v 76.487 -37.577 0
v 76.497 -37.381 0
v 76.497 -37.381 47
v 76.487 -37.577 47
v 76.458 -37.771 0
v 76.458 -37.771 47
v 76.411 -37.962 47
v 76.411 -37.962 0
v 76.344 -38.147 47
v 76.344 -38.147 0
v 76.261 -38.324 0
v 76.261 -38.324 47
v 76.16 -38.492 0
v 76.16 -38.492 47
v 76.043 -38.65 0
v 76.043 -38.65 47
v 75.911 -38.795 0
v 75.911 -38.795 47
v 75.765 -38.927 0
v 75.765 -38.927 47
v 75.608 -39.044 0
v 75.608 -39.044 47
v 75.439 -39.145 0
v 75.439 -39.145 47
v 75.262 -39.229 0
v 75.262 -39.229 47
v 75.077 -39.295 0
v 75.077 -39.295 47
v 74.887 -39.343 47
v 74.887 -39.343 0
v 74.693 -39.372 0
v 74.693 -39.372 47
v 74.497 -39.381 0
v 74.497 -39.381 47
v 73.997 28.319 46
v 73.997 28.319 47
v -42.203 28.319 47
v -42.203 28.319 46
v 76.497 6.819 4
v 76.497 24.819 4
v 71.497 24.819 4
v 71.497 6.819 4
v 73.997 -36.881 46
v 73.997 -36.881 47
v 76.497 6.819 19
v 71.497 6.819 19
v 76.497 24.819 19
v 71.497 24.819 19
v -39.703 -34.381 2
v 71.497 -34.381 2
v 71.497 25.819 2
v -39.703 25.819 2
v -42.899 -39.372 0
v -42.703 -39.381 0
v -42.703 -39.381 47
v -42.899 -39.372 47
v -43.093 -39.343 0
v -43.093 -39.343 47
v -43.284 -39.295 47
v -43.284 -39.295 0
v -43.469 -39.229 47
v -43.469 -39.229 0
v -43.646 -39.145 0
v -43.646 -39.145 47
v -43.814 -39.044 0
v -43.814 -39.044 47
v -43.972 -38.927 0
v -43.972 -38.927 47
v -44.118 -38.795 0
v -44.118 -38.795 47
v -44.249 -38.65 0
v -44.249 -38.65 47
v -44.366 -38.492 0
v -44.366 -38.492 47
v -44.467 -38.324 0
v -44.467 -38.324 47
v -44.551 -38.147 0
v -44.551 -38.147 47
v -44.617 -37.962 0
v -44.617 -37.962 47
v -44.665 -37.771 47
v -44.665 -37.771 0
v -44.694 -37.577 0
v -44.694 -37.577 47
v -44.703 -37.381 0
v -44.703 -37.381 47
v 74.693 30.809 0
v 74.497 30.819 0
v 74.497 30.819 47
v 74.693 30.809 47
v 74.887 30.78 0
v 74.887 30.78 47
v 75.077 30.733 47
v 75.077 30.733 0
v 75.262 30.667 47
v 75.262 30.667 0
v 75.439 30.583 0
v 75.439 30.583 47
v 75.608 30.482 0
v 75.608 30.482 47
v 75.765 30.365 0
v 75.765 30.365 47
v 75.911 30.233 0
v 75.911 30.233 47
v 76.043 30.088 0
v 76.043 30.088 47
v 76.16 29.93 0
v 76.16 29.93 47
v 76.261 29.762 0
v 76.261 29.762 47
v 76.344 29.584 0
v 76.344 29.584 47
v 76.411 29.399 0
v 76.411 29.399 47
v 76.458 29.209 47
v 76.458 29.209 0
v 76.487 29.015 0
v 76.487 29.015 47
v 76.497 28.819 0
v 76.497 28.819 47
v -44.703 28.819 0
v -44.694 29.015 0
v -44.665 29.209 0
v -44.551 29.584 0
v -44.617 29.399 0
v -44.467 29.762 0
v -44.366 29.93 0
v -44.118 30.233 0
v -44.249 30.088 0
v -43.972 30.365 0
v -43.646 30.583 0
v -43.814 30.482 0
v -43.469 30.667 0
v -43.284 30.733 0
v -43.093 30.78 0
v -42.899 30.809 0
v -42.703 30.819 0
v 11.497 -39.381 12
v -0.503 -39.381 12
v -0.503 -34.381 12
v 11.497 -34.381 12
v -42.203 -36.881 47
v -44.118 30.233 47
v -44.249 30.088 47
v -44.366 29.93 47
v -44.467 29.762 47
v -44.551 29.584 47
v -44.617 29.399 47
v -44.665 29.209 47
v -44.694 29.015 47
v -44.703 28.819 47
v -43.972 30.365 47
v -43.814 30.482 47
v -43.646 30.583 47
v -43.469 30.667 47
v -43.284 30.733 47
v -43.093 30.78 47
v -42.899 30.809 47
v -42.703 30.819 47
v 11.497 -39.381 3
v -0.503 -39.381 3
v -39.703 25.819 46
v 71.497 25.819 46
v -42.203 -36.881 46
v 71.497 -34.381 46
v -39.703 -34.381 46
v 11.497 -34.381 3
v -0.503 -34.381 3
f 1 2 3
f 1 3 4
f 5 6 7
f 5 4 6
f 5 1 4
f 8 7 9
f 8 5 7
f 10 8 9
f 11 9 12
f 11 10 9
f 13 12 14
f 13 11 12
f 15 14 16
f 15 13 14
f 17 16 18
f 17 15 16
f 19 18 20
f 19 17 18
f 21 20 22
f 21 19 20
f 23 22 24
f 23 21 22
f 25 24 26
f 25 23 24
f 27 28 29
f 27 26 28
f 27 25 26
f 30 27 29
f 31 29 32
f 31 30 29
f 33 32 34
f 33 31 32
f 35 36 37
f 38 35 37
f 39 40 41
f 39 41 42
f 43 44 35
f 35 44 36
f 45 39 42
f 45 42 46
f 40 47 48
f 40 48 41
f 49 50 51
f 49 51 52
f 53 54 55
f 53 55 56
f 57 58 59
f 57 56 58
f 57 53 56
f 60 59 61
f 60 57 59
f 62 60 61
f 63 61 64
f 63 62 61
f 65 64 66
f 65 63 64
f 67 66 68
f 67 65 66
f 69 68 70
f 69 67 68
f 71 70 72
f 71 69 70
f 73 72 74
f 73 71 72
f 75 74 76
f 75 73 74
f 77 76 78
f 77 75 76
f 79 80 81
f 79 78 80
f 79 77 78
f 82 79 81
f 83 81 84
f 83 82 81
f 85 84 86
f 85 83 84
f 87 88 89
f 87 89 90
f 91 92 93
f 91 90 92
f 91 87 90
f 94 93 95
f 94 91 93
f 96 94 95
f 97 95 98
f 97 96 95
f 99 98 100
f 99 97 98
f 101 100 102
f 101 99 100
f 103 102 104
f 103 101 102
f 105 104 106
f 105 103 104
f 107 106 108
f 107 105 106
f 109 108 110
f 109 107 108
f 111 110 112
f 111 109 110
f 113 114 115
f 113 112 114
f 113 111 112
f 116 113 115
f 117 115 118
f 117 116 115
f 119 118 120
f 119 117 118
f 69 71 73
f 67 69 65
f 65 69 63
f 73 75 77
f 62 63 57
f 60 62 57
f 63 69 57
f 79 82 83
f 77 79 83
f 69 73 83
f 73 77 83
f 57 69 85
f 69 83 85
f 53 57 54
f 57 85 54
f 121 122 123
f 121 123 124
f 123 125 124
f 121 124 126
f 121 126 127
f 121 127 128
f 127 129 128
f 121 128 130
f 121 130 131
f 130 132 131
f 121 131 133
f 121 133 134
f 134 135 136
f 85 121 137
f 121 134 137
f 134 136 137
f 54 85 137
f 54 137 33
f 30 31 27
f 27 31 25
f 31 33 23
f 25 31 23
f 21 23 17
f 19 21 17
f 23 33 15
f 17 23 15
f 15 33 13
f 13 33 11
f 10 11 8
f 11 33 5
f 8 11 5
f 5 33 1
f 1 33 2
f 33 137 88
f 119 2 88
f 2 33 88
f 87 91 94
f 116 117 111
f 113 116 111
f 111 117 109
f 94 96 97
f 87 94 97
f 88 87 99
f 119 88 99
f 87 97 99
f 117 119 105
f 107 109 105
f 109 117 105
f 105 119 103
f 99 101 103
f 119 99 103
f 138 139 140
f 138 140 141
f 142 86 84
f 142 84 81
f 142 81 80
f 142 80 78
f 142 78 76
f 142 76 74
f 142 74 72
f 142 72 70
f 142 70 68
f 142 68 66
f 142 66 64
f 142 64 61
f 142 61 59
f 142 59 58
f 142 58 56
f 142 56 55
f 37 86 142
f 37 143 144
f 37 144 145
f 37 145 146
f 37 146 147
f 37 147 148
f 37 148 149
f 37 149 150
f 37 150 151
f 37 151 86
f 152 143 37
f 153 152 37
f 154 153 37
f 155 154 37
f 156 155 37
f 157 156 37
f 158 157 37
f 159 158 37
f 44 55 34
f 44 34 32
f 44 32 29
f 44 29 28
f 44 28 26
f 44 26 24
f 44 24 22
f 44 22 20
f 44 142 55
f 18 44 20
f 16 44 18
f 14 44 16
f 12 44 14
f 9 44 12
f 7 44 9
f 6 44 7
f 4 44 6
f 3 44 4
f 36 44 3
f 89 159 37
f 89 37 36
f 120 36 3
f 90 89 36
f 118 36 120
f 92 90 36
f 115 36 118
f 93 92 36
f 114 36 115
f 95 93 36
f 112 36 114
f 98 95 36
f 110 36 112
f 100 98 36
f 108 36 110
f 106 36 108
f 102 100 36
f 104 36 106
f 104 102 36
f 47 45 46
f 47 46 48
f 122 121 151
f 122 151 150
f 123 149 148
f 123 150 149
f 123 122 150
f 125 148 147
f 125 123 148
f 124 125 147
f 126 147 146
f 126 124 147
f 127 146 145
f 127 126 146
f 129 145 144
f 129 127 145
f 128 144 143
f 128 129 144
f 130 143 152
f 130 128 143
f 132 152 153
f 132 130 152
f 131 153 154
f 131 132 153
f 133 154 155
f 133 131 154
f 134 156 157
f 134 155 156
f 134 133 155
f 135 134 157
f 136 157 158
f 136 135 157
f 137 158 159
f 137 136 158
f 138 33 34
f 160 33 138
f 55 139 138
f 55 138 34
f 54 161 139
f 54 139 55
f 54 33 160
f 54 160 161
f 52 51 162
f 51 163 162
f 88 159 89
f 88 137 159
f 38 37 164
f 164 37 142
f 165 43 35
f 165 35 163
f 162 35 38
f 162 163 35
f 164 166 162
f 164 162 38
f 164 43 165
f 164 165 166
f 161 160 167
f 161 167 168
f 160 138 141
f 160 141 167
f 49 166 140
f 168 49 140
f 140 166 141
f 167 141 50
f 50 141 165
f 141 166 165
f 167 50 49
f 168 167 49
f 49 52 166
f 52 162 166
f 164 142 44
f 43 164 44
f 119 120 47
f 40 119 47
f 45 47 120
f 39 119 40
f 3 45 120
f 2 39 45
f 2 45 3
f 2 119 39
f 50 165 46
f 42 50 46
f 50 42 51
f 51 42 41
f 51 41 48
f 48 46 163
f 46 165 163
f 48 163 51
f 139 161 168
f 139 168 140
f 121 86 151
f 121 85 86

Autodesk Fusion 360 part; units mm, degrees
sketch "Esquisse1" plane through (0, 0, 0) normal (0, 0, 1) x (1, 0, 0)
  line L0 (74.4967, -39.3812) -> (-42.7033, -39.3812)
  line L1 (-42.7033, 30.8188) -> (74.4967, 30.8188)
  line L2 (76.4967, 28.8188) -> (76.4967, -37.3812)
  line L3 (-44.7033, -37.3812) -> (-44.7033, 28.8188)
  arc A0 (76.4967, 28.8188) -> (74.4967, 30.8188) centre (74.4967, 28.8188) ccw
  arc A1 (-42.7033, 30.8188) -> (-44.7033, 28.8188) centre (-42.7033, 28.8188) ccw
  arc A2 (-44.7033, -37.3812) -> (-42.7033, -39.3812) centre (-42.7033, -37.3812) ccw
  arc A3 (74.4967, -39.3812) -> (76.4967, -37.3812) centre (74.4967, -37.3812) ccw
  point P0 (-37.2797, 0.2421)
  point P1 (-65.57, -27.6552)
  dimension "d25" = 121.2
  dimension "d26" = 70.2
  dimension "d31" = 2
  dimension "d32" = 2
  dimension "d33" = 2
  dimension "d34" = 2
extrude "Extrusion1" add sketch "Esquisse1" along normal blind 47
sketch "Esquisse2" plane through (0, 0, 47) normal (0, 0, 1) x (-1, 0, 0)
  arc A0 (44.7033, 37.3812) -> (42.7033, 39.3812) centre (42.7033, 37.3812) ccw
  line L0 (42.7033, 39.3812) -> (-74.4967, 39.3812)
  arc A1 (-74.4967, 39.3812) -> (-76.4967, 37.3812) centre (-74.4967, 37.3812) ccw
  line L1 (-76.4967, 37.3812) -> (-76.4967, -28.8188)
  arc A2 (-76.4967, -28.8188) -> (-74.4967, -30.8188) centre (-74.4967, -28.8188) ccw
  line L2 (-74.4967, -30.8188) -> (42.7033, -30.8188)
  arc A3 (42.7033, -30.8188) -> (44.7033, -28.8188) centre (42.7033, -28.8188) ccw
  line L3 (44.7033, -28.8188) -> (44.7033, 37.3812)
  line L4 (39.7033, -25.8188) -> (39.7033, 34.3812)
  line L5 (39.7033, 34.3812) -> (-71.4967, 34.3812)
  line L6 (-71.4967, 34.3812) -> (-71.4967, -25.8188)
  line L7 (-71.4967, -25.8188) -> (39.7033, -25.8188)
  line L8 (42.2033, -28.3188) -> (42.2033, 36.8812)
  line L9 (42.2033, 36.8812) -> (-73.9967, 36.8812)
  line L10 (-73.9967, 36.8812) -> (-73.9967, -28.3188)
  line L11 (-73.9967, -28.3188) -> (42.2033, -28.3188)
  dimension "d37" = -2.5
  dimension "d49" = -5
extrude "Extrusion2" cut sketch "Esquisse2" against normal blind 1 contours L4 L5 L6 L7 | L8 L9 L10 L11
extrude "Extrusion4" cut sketch "Esquisse2" against normal blind 45 contours L4 L5 L6 L7
sketch "Esquisse3" plane through (76.4967, 0, 0) normal (1, 0, 0) x (0, 1, 0)
  line L0 (-37.3812, 0) -> (28.8188, 0)
  line L1 (28.8188, 0) -> (28.8188, 47)
  line L2 (28.8188, 47) -> (-37.3812, 47)
  line L3 (-37.3812, 47) -> (-37.3812, 0)
  line L4 (6.8188, 19) -> (24.8188, 19)
  line L5 (24.8188, 19) -> (24.8188, 4)
  line L6 (24.8188, 4) -> (6.8188, 4)
  line L7 (6.8188, 4) -> (6.8188, 19)
  dimension "d40" = 18
  dimension "d42" = 19
  dimension "d44" = 4
  dimension "d47" = 15
extrude "Extrusion3" cut sketch "Esquisse3" against normal blind 50 contours L4 L5 L6 L7
sketch "Esquisse4" plane through (0, -39.3812, 0) normal (0, -1, 0) x (1, 0, 0)
  line L0 (-42.7033, 0) -> (74.4967, 0)
  line L1 (74.4967, 0) -> (74.4967, 47)
  line L2 (74.4967, 47) -> (-42.7033, 47)
  line L3 (-42.7033, 47) -> (-42.7033, 0)
  line L4 (-0.5033, 12) -> (11.4967, 12)
  line L5 (11.4967, 12) -> (11.4967, 3)
  line L6 (11.4967, 3) -> (-0.5033, 3)
  line L7 (-0.5033, 3) -> (-0.5033, 12)
  dimension "d52" = 12
  dimension "d53" = 9
  dimension "d54" = 75
  dimension "d55" = 3
extrude "Extrusion5" cut sketch "Esquisse4" against normal blind 25 contours L4 L5 L6 L7
